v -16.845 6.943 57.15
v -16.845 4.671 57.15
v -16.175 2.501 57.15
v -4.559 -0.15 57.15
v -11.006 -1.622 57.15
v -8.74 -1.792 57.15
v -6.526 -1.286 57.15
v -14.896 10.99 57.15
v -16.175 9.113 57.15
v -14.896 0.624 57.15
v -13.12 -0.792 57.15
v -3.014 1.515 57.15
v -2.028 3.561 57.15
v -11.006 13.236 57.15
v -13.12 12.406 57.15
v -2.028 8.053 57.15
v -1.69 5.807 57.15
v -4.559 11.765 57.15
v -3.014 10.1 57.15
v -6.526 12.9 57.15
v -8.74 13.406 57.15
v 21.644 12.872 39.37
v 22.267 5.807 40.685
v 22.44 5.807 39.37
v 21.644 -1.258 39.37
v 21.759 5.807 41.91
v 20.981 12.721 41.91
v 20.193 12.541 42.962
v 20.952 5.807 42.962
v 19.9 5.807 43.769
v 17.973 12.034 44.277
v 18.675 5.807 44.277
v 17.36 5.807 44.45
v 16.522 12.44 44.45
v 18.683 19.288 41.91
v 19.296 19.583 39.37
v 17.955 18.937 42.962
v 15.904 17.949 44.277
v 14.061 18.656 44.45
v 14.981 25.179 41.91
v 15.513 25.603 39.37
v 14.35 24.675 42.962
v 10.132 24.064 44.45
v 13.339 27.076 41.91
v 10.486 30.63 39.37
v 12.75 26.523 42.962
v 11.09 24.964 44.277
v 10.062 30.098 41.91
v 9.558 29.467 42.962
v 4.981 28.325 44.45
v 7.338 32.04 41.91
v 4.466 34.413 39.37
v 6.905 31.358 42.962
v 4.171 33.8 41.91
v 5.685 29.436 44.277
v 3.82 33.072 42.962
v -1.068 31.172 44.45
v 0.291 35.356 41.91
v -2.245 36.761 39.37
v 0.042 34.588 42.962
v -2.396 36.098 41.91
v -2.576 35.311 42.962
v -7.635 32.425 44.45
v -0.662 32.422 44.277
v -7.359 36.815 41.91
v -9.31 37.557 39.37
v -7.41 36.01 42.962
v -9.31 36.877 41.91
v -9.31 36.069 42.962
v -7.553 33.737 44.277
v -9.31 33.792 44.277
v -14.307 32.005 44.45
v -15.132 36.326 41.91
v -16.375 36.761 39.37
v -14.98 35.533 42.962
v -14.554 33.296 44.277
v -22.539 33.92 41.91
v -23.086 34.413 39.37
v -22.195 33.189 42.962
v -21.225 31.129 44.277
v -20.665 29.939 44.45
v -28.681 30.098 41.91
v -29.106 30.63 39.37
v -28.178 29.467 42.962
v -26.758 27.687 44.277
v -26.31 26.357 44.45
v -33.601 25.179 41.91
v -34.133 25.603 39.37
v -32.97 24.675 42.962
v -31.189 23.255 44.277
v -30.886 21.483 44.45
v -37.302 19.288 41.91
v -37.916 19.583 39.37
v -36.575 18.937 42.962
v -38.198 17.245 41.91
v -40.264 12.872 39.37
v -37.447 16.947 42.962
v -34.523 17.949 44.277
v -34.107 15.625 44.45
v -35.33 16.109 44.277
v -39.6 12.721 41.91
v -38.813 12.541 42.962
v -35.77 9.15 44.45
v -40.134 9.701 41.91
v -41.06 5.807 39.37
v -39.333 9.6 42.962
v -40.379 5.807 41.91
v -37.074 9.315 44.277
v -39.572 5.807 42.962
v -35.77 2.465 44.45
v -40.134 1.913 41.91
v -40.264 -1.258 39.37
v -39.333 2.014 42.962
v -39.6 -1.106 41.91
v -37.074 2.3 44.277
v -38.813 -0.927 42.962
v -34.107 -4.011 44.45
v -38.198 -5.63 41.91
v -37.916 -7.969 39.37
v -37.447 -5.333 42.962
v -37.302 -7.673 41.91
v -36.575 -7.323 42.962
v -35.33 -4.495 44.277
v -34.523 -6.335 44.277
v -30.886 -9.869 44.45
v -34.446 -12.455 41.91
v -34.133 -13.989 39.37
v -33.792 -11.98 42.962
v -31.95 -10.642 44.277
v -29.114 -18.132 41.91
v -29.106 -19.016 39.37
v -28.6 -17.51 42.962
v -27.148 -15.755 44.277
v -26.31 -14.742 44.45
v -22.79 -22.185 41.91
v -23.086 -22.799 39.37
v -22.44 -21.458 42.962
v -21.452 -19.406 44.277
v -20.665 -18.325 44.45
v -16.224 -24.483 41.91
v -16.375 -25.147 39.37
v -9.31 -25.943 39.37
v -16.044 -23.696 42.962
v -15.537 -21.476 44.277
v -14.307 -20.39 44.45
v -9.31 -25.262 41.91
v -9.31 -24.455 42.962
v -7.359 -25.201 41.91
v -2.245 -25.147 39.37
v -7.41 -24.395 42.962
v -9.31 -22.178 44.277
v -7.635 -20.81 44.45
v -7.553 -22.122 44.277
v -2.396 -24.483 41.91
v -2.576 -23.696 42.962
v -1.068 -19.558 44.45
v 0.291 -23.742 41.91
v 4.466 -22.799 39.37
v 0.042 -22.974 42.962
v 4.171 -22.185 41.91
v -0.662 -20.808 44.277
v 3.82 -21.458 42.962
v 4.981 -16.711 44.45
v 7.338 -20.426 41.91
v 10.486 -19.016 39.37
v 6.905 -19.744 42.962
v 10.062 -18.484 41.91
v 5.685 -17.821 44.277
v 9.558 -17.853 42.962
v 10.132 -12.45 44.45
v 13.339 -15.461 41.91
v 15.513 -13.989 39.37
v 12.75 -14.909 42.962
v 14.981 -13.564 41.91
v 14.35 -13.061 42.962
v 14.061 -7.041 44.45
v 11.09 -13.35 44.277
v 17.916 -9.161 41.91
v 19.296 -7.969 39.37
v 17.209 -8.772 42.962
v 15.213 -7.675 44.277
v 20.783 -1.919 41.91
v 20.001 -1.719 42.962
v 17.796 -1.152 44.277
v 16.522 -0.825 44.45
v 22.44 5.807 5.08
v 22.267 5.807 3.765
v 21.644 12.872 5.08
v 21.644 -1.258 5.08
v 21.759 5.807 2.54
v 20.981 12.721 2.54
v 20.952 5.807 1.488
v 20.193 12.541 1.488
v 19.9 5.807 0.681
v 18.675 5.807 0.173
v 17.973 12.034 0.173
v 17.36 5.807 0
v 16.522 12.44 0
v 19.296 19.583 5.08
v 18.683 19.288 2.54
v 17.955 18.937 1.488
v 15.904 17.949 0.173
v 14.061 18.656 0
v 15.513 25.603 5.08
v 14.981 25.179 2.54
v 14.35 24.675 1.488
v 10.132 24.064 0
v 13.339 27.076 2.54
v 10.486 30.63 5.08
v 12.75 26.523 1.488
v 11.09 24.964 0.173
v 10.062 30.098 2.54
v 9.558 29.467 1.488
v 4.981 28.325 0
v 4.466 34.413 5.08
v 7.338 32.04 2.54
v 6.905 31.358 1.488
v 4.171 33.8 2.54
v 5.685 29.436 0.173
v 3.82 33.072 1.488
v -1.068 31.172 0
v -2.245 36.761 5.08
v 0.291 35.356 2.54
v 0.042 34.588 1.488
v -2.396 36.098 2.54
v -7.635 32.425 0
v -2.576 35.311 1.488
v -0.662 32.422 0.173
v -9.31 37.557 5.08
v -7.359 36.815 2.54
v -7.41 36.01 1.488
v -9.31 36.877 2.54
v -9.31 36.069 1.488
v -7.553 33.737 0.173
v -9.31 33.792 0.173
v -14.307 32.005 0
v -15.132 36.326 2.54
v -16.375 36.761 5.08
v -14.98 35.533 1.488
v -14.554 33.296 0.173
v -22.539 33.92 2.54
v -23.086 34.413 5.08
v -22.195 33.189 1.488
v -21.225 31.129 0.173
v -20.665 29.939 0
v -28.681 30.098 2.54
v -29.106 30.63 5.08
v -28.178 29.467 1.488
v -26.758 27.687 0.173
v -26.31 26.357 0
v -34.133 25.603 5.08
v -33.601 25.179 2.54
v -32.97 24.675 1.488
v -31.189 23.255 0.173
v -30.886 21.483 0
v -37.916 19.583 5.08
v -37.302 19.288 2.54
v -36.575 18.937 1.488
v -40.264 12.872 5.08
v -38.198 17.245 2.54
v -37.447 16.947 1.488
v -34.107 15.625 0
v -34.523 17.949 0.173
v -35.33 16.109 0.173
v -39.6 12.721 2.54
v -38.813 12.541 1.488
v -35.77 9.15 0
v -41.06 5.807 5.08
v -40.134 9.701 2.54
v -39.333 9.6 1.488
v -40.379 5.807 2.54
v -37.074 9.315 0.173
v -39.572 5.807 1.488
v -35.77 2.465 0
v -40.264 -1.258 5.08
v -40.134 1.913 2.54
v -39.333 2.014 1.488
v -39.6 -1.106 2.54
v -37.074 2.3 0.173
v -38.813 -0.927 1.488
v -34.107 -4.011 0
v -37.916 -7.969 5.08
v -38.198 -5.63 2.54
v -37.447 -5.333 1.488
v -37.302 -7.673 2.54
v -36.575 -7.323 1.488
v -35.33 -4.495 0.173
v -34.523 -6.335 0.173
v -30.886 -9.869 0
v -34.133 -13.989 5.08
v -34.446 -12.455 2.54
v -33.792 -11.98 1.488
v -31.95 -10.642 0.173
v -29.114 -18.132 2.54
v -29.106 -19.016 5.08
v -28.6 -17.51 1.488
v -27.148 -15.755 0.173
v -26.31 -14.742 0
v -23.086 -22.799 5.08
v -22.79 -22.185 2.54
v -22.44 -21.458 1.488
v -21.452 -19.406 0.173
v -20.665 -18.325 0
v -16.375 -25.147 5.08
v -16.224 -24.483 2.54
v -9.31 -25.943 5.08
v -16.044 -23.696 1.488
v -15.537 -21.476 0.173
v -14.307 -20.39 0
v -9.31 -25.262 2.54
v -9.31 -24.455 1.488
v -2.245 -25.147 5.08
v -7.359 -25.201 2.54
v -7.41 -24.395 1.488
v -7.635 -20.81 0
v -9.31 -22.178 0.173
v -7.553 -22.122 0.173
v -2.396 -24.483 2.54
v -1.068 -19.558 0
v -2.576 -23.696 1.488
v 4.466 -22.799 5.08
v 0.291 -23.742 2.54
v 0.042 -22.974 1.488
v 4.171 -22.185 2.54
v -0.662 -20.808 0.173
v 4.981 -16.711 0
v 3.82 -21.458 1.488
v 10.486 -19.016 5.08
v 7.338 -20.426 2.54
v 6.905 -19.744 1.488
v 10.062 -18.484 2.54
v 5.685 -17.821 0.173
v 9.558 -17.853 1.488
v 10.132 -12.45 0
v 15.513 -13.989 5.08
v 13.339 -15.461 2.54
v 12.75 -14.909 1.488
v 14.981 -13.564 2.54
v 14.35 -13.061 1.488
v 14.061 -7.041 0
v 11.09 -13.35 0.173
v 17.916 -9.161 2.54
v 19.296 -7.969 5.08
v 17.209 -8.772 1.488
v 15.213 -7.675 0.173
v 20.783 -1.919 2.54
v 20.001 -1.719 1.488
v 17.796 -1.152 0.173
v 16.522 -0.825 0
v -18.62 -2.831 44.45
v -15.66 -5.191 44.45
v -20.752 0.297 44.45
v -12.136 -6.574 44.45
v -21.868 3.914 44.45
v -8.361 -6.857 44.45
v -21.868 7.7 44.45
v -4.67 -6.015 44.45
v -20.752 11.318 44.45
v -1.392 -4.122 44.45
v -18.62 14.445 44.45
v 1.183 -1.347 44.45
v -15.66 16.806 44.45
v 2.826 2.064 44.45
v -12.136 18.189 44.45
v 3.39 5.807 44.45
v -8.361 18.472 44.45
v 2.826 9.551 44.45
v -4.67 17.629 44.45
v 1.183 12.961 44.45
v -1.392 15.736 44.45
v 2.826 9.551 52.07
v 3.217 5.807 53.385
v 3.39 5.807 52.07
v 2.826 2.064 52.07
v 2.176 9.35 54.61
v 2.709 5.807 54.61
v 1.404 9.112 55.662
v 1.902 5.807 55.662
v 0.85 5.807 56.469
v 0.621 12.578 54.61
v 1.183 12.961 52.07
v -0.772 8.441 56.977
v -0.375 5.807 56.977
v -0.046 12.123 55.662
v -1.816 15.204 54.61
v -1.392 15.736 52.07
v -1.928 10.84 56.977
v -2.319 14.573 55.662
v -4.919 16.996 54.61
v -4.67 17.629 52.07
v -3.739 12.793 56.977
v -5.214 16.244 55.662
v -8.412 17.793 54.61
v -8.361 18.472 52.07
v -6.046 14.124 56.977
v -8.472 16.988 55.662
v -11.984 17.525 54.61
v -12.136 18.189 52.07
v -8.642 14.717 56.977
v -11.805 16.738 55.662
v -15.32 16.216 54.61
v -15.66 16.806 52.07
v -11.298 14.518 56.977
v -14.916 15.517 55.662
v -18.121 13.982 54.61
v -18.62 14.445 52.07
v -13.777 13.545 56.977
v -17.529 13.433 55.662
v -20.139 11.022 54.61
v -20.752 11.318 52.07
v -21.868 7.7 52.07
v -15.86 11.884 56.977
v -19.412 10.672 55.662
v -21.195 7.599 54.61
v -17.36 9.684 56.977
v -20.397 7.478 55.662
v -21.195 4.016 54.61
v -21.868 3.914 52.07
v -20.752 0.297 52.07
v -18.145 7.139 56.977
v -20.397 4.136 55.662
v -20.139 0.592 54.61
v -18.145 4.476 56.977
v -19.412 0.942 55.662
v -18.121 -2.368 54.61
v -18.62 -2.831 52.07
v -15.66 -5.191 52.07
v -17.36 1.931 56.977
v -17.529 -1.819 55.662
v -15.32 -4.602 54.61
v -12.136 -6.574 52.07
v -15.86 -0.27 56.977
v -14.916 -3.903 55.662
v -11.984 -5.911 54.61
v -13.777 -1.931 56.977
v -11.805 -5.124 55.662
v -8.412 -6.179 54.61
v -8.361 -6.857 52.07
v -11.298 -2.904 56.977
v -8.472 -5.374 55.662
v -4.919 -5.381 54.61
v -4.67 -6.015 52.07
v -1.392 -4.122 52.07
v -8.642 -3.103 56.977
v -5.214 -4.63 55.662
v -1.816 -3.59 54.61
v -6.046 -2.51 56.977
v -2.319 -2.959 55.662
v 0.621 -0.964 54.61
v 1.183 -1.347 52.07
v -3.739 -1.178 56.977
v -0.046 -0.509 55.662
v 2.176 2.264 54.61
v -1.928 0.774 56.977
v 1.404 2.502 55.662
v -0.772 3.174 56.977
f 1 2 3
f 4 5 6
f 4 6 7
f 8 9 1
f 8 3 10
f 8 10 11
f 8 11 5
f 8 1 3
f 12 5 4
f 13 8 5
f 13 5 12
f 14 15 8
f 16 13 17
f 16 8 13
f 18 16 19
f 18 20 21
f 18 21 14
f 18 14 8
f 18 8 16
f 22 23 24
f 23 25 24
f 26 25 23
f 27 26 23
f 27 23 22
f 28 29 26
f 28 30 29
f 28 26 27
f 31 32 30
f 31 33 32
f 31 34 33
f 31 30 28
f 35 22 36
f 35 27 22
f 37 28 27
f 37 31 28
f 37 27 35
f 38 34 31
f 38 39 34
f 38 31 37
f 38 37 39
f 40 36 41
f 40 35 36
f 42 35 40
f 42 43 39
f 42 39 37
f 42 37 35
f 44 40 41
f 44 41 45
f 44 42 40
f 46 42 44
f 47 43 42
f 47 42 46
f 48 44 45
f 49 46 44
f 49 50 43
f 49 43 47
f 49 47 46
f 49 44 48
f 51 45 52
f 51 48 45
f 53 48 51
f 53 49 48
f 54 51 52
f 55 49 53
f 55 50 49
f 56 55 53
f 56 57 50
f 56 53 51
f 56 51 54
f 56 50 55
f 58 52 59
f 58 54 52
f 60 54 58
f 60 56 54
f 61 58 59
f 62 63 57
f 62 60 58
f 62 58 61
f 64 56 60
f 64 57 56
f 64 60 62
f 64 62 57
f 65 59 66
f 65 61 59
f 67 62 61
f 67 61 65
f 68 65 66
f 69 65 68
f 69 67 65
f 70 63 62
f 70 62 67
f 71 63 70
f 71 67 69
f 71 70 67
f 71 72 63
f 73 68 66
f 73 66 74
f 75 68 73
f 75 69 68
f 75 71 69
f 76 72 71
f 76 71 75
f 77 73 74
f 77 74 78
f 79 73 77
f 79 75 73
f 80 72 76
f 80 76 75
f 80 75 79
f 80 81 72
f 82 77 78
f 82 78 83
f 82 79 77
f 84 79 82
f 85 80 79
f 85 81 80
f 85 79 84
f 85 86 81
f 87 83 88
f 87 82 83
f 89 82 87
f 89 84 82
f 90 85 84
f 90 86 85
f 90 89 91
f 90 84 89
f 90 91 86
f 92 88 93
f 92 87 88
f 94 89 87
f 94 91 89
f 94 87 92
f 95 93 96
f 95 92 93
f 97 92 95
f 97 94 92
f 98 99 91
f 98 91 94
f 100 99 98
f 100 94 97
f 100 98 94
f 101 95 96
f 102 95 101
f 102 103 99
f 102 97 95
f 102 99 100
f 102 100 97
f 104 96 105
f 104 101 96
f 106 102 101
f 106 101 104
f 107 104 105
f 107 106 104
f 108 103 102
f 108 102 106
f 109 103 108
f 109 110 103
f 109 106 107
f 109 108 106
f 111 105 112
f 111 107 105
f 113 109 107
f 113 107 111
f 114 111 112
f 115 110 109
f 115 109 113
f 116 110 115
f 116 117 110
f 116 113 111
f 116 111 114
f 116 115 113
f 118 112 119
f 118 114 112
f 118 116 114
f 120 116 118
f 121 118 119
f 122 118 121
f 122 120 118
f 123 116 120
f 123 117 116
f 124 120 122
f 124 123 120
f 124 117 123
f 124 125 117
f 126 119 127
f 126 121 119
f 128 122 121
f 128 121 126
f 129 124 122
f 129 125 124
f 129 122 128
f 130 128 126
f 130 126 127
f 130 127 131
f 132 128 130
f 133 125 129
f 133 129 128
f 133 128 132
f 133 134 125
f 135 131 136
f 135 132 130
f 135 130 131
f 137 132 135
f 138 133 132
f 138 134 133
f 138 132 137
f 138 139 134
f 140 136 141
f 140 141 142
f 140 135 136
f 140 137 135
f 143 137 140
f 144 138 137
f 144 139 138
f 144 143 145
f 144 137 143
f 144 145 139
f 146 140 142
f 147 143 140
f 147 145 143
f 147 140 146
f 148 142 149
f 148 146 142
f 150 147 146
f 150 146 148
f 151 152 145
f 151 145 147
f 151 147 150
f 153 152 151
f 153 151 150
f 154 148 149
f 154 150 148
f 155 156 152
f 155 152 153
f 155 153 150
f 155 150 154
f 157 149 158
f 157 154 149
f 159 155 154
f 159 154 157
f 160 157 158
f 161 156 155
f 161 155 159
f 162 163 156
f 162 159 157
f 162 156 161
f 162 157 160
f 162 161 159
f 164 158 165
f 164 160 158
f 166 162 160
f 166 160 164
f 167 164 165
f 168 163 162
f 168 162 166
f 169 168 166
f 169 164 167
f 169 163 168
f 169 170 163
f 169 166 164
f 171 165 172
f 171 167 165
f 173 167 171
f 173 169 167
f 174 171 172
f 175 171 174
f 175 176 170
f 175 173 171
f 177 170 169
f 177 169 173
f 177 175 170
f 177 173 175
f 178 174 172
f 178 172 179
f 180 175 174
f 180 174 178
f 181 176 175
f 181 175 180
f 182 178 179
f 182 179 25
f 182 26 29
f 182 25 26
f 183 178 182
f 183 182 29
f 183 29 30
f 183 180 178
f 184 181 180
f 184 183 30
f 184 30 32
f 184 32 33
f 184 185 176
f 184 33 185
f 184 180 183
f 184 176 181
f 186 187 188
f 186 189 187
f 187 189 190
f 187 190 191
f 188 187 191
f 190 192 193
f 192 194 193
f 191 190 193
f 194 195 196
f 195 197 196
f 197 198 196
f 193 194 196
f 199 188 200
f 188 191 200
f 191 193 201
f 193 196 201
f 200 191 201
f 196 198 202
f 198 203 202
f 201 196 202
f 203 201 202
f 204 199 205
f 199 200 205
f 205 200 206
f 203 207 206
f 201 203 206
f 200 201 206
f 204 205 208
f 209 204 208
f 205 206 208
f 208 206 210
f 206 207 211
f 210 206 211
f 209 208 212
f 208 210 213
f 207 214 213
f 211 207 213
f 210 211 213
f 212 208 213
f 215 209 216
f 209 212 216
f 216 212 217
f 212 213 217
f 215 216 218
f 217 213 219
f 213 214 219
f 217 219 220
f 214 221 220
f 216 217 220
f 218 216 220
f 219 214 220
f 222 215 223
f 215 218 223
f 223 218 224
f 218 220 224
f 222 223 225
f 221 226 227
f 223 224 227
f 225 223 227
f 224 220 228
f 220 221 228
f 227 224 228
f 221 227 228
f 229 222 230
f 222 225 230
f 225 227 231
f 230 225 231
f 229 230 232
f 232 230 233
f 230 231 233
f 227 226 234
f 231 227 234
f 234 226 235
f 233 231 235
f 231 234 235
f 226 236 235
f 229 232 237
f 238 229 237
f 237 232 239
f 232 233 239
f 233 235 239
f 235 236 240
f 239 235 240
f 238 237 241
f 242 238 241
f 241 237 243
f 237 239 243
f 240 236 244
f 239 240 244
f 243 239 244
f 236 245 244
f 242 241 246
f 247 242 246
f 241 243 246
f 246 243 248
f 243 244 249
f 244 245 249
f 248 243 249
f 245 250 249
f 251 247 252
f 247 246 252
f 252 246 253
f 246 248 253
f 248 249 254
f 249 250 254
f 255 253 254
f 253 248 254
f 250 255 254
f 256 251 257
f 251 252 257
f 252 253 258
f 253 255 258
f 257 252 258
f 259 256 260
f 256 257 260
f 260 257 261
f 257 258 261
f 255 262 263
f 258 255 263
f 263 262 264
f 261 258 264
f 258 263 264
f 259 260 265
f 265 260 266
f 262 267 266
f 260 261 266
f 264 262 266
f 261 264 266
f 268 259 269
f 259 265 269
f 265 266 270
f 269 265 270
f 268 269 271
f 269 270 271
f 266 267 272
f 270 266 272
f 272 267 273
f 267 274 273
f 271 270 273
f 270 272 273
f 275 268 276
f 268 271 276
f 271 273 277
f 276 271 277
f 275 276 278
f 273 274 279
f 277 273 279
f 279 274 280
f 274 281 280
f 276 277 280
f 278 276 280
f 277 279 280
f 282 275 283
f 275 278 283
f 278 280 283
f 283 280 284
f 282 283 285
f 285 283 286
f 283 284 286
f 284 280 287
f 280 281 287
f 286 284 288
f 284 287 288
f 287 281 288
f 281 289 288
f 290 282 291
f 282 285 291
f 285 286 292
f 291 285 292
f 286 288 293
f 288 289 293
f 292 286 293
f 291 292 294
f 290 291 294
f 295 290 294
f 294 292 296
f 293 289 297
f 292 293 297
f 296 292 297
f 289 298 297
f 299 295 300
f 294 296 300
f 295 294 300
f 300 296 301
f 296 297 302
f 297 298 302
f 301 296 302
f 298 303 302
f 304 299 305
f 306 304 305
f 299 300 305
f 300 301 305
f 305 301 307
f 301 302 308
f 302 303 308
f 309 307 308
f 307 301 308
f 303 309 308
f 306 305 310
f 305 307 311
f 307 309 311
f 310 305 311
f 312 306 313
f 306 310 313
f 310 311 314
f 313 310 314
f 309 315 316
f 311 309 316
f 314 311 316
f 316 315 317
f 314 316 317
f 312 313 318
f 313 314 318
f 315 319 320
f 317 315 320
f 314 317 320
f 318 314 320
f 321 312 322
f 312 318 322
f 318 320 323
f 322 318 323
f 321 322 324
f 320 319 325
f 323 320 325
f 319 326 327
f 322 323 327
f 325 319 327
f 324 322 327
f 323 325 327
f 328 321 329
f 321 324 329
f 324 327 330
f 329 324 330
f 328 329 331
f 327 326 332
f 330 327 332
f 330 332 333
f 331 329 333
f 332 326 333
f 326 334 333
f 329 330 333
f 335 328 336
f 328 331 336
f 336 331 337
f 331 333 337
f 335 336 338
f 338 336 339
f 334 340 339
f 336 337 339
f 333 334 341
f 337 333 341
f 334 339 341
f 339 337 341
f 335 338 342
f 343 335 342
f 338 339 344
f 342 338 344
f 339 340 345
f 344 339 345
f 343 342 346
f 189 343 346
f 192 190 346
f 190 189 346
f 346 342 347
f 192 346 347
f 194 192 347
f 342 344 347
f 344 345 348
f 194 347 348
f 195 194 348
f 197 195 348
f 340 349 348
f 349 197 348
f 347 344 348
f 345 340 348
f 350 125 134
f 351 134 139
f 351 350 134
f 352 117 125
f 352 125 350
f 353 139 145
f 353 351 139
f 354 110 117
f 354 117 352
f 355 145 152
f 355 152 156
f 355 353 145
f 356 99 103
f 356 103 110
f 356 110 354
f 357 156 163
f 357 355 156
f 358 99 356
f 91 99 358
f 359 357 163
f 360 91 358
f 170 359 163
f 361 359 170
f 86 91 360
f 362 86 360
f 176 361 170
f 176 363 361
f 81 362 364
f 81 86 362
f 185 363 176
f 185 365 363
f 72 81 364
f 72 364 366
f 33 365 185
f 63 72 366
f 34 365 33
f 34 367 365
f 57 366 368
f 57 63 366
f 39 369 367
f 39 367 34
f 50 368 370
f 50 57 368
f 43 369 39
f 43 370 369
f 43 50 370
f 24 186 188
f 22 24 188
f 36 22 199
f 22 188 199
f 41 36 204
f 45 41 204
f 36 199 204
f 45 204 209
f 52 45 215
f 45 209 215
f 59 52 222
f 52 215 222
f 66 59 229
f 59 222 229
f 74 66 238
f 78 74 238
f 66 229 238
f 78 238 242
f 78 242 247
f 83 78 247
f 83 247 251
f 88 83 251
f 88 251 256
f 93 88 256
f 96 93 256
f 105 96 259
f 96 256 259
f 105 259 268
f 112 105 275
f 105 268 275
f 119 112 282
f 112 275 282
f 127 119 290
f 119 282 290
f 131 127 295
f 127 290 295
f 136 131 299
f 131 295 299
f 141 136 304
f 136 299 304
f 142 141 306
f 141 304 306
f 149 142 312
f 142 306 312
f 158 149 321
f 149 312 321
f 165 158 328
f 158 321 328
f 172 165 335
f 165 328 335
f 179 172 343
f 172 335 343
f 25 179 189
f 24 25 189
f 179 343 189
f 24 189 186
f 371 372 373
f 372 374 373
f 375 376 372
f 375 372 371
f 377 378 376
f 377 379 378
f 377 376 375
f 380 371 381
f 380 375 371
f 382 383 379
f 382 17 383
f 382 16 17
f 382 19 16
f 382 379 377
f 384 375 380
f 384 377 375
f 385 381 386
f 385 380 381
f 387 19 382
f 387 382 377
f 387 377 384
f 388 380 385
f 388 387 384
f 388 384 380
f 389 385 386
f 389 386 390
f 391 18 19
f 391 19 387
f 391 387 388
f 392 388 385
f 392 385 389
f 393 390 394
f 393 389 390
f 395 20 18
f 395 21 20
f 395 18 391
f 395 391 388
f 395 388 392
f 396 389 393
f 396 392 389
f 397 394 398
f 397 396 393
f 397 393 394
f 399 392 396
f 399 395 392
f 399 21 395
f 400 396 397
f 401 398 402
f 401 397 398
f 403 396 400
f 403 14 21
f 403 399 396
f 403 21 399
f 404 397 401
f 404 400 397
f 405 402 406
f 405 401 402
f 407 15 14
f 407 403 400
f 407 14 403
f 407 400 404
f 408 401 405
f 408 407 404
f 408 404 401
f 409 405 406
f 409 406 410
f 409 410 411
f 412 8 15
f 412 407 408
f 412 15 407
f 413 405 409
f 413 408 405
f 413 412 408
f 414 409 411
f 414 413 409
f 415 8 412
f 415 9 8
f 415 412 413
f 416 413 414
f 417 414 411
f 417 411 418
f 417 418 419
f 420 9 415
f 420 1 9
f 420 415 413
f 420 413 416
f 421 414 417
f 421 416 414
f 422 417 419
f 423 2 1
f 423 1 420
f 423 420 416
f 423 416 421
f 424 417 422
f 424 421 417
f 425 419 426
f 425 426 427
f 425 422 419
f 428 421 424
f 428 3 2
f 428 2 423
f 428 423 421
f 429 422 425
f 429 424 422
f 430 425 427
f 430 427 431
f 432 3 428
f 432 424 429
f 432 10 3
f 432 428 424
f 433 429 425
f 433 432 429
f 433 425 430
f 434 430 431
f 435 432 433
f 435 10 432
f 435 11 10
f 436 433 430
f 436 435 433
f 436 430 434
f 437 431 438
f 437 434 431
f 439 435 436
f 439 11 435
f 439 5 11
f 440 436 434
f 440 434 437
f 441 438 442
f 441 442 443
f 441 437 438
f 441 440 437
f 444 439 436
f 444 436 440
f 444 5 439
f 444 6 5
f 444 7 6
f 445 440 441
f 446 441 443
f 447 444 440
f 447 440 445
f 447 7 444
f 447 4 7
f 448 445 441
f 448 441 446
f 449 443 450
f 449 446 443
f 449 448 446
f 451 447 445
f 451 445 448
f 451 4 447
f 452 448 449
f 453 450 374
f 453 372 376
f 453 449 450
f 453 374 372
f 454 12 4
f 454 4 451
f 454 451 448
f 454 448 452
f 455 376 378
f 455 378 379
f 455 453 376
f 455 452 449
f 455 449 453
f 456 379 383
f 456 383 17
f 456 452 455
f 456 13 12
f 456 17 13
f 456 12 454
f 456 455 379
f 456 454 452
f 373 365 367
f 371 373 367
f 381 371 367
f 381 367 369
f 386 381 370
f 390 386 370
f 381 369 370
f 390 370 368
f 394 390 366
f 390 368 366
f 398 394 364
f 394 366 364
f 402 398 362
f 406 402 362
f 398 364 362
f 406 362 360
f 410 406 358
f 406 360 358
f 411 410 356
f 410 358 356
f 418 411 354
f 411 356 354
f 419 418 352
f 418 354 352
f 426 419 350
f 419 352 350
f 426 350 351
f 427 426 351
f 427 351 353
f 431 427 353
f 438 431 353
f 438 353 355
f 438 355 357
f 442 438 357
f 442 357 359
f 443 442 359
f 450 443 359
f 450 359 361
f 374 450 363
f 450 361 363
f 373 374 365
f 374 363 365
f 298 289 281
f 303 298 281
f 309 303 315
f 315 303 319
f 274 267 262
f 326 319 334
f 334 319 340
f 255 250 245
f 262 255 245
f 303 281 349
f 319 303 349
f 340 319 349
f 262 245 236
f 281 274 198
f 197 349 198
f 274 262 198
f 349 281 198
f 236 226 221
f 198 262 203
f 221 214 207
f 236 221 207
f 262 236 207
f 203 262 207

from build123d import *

# Parameters (mm, degrees)
F0_R     = 31.75
F1_DEPTH = 44.45
F2_R     = 12.7
F3_DEPTH = 12.7
F4_R     = 5.08


with BuildPart() as f1:
    # F0 (on Top) → F1 (new body)
    with BuildSketch(Plane.XY):
        with Locations((-9.30992, 5.807177)):
            Circle(F0_R)
    extrude(amount=F1_DEPTH)

    # F2 (on face) → F3 (join)
    with BuildSketch(Plane.XY.offset(44.45)):
        with Locations((-9.30992, 5.807177)):
            Circle(F2_R)
    extrude(amount=F3_DEPTH)

    # F4
    f4_edges = [f1.edges().sort_by_distance(p)[0] for p in [
        (-41.05992, 5.807177, 44.45),
        (-41.05992, 5.807177, 0),
        (-22.00992, 5.807177, 57.15),
    ]]
    fillet(f4_edges, radius=F4_R)


solid = f1.part
